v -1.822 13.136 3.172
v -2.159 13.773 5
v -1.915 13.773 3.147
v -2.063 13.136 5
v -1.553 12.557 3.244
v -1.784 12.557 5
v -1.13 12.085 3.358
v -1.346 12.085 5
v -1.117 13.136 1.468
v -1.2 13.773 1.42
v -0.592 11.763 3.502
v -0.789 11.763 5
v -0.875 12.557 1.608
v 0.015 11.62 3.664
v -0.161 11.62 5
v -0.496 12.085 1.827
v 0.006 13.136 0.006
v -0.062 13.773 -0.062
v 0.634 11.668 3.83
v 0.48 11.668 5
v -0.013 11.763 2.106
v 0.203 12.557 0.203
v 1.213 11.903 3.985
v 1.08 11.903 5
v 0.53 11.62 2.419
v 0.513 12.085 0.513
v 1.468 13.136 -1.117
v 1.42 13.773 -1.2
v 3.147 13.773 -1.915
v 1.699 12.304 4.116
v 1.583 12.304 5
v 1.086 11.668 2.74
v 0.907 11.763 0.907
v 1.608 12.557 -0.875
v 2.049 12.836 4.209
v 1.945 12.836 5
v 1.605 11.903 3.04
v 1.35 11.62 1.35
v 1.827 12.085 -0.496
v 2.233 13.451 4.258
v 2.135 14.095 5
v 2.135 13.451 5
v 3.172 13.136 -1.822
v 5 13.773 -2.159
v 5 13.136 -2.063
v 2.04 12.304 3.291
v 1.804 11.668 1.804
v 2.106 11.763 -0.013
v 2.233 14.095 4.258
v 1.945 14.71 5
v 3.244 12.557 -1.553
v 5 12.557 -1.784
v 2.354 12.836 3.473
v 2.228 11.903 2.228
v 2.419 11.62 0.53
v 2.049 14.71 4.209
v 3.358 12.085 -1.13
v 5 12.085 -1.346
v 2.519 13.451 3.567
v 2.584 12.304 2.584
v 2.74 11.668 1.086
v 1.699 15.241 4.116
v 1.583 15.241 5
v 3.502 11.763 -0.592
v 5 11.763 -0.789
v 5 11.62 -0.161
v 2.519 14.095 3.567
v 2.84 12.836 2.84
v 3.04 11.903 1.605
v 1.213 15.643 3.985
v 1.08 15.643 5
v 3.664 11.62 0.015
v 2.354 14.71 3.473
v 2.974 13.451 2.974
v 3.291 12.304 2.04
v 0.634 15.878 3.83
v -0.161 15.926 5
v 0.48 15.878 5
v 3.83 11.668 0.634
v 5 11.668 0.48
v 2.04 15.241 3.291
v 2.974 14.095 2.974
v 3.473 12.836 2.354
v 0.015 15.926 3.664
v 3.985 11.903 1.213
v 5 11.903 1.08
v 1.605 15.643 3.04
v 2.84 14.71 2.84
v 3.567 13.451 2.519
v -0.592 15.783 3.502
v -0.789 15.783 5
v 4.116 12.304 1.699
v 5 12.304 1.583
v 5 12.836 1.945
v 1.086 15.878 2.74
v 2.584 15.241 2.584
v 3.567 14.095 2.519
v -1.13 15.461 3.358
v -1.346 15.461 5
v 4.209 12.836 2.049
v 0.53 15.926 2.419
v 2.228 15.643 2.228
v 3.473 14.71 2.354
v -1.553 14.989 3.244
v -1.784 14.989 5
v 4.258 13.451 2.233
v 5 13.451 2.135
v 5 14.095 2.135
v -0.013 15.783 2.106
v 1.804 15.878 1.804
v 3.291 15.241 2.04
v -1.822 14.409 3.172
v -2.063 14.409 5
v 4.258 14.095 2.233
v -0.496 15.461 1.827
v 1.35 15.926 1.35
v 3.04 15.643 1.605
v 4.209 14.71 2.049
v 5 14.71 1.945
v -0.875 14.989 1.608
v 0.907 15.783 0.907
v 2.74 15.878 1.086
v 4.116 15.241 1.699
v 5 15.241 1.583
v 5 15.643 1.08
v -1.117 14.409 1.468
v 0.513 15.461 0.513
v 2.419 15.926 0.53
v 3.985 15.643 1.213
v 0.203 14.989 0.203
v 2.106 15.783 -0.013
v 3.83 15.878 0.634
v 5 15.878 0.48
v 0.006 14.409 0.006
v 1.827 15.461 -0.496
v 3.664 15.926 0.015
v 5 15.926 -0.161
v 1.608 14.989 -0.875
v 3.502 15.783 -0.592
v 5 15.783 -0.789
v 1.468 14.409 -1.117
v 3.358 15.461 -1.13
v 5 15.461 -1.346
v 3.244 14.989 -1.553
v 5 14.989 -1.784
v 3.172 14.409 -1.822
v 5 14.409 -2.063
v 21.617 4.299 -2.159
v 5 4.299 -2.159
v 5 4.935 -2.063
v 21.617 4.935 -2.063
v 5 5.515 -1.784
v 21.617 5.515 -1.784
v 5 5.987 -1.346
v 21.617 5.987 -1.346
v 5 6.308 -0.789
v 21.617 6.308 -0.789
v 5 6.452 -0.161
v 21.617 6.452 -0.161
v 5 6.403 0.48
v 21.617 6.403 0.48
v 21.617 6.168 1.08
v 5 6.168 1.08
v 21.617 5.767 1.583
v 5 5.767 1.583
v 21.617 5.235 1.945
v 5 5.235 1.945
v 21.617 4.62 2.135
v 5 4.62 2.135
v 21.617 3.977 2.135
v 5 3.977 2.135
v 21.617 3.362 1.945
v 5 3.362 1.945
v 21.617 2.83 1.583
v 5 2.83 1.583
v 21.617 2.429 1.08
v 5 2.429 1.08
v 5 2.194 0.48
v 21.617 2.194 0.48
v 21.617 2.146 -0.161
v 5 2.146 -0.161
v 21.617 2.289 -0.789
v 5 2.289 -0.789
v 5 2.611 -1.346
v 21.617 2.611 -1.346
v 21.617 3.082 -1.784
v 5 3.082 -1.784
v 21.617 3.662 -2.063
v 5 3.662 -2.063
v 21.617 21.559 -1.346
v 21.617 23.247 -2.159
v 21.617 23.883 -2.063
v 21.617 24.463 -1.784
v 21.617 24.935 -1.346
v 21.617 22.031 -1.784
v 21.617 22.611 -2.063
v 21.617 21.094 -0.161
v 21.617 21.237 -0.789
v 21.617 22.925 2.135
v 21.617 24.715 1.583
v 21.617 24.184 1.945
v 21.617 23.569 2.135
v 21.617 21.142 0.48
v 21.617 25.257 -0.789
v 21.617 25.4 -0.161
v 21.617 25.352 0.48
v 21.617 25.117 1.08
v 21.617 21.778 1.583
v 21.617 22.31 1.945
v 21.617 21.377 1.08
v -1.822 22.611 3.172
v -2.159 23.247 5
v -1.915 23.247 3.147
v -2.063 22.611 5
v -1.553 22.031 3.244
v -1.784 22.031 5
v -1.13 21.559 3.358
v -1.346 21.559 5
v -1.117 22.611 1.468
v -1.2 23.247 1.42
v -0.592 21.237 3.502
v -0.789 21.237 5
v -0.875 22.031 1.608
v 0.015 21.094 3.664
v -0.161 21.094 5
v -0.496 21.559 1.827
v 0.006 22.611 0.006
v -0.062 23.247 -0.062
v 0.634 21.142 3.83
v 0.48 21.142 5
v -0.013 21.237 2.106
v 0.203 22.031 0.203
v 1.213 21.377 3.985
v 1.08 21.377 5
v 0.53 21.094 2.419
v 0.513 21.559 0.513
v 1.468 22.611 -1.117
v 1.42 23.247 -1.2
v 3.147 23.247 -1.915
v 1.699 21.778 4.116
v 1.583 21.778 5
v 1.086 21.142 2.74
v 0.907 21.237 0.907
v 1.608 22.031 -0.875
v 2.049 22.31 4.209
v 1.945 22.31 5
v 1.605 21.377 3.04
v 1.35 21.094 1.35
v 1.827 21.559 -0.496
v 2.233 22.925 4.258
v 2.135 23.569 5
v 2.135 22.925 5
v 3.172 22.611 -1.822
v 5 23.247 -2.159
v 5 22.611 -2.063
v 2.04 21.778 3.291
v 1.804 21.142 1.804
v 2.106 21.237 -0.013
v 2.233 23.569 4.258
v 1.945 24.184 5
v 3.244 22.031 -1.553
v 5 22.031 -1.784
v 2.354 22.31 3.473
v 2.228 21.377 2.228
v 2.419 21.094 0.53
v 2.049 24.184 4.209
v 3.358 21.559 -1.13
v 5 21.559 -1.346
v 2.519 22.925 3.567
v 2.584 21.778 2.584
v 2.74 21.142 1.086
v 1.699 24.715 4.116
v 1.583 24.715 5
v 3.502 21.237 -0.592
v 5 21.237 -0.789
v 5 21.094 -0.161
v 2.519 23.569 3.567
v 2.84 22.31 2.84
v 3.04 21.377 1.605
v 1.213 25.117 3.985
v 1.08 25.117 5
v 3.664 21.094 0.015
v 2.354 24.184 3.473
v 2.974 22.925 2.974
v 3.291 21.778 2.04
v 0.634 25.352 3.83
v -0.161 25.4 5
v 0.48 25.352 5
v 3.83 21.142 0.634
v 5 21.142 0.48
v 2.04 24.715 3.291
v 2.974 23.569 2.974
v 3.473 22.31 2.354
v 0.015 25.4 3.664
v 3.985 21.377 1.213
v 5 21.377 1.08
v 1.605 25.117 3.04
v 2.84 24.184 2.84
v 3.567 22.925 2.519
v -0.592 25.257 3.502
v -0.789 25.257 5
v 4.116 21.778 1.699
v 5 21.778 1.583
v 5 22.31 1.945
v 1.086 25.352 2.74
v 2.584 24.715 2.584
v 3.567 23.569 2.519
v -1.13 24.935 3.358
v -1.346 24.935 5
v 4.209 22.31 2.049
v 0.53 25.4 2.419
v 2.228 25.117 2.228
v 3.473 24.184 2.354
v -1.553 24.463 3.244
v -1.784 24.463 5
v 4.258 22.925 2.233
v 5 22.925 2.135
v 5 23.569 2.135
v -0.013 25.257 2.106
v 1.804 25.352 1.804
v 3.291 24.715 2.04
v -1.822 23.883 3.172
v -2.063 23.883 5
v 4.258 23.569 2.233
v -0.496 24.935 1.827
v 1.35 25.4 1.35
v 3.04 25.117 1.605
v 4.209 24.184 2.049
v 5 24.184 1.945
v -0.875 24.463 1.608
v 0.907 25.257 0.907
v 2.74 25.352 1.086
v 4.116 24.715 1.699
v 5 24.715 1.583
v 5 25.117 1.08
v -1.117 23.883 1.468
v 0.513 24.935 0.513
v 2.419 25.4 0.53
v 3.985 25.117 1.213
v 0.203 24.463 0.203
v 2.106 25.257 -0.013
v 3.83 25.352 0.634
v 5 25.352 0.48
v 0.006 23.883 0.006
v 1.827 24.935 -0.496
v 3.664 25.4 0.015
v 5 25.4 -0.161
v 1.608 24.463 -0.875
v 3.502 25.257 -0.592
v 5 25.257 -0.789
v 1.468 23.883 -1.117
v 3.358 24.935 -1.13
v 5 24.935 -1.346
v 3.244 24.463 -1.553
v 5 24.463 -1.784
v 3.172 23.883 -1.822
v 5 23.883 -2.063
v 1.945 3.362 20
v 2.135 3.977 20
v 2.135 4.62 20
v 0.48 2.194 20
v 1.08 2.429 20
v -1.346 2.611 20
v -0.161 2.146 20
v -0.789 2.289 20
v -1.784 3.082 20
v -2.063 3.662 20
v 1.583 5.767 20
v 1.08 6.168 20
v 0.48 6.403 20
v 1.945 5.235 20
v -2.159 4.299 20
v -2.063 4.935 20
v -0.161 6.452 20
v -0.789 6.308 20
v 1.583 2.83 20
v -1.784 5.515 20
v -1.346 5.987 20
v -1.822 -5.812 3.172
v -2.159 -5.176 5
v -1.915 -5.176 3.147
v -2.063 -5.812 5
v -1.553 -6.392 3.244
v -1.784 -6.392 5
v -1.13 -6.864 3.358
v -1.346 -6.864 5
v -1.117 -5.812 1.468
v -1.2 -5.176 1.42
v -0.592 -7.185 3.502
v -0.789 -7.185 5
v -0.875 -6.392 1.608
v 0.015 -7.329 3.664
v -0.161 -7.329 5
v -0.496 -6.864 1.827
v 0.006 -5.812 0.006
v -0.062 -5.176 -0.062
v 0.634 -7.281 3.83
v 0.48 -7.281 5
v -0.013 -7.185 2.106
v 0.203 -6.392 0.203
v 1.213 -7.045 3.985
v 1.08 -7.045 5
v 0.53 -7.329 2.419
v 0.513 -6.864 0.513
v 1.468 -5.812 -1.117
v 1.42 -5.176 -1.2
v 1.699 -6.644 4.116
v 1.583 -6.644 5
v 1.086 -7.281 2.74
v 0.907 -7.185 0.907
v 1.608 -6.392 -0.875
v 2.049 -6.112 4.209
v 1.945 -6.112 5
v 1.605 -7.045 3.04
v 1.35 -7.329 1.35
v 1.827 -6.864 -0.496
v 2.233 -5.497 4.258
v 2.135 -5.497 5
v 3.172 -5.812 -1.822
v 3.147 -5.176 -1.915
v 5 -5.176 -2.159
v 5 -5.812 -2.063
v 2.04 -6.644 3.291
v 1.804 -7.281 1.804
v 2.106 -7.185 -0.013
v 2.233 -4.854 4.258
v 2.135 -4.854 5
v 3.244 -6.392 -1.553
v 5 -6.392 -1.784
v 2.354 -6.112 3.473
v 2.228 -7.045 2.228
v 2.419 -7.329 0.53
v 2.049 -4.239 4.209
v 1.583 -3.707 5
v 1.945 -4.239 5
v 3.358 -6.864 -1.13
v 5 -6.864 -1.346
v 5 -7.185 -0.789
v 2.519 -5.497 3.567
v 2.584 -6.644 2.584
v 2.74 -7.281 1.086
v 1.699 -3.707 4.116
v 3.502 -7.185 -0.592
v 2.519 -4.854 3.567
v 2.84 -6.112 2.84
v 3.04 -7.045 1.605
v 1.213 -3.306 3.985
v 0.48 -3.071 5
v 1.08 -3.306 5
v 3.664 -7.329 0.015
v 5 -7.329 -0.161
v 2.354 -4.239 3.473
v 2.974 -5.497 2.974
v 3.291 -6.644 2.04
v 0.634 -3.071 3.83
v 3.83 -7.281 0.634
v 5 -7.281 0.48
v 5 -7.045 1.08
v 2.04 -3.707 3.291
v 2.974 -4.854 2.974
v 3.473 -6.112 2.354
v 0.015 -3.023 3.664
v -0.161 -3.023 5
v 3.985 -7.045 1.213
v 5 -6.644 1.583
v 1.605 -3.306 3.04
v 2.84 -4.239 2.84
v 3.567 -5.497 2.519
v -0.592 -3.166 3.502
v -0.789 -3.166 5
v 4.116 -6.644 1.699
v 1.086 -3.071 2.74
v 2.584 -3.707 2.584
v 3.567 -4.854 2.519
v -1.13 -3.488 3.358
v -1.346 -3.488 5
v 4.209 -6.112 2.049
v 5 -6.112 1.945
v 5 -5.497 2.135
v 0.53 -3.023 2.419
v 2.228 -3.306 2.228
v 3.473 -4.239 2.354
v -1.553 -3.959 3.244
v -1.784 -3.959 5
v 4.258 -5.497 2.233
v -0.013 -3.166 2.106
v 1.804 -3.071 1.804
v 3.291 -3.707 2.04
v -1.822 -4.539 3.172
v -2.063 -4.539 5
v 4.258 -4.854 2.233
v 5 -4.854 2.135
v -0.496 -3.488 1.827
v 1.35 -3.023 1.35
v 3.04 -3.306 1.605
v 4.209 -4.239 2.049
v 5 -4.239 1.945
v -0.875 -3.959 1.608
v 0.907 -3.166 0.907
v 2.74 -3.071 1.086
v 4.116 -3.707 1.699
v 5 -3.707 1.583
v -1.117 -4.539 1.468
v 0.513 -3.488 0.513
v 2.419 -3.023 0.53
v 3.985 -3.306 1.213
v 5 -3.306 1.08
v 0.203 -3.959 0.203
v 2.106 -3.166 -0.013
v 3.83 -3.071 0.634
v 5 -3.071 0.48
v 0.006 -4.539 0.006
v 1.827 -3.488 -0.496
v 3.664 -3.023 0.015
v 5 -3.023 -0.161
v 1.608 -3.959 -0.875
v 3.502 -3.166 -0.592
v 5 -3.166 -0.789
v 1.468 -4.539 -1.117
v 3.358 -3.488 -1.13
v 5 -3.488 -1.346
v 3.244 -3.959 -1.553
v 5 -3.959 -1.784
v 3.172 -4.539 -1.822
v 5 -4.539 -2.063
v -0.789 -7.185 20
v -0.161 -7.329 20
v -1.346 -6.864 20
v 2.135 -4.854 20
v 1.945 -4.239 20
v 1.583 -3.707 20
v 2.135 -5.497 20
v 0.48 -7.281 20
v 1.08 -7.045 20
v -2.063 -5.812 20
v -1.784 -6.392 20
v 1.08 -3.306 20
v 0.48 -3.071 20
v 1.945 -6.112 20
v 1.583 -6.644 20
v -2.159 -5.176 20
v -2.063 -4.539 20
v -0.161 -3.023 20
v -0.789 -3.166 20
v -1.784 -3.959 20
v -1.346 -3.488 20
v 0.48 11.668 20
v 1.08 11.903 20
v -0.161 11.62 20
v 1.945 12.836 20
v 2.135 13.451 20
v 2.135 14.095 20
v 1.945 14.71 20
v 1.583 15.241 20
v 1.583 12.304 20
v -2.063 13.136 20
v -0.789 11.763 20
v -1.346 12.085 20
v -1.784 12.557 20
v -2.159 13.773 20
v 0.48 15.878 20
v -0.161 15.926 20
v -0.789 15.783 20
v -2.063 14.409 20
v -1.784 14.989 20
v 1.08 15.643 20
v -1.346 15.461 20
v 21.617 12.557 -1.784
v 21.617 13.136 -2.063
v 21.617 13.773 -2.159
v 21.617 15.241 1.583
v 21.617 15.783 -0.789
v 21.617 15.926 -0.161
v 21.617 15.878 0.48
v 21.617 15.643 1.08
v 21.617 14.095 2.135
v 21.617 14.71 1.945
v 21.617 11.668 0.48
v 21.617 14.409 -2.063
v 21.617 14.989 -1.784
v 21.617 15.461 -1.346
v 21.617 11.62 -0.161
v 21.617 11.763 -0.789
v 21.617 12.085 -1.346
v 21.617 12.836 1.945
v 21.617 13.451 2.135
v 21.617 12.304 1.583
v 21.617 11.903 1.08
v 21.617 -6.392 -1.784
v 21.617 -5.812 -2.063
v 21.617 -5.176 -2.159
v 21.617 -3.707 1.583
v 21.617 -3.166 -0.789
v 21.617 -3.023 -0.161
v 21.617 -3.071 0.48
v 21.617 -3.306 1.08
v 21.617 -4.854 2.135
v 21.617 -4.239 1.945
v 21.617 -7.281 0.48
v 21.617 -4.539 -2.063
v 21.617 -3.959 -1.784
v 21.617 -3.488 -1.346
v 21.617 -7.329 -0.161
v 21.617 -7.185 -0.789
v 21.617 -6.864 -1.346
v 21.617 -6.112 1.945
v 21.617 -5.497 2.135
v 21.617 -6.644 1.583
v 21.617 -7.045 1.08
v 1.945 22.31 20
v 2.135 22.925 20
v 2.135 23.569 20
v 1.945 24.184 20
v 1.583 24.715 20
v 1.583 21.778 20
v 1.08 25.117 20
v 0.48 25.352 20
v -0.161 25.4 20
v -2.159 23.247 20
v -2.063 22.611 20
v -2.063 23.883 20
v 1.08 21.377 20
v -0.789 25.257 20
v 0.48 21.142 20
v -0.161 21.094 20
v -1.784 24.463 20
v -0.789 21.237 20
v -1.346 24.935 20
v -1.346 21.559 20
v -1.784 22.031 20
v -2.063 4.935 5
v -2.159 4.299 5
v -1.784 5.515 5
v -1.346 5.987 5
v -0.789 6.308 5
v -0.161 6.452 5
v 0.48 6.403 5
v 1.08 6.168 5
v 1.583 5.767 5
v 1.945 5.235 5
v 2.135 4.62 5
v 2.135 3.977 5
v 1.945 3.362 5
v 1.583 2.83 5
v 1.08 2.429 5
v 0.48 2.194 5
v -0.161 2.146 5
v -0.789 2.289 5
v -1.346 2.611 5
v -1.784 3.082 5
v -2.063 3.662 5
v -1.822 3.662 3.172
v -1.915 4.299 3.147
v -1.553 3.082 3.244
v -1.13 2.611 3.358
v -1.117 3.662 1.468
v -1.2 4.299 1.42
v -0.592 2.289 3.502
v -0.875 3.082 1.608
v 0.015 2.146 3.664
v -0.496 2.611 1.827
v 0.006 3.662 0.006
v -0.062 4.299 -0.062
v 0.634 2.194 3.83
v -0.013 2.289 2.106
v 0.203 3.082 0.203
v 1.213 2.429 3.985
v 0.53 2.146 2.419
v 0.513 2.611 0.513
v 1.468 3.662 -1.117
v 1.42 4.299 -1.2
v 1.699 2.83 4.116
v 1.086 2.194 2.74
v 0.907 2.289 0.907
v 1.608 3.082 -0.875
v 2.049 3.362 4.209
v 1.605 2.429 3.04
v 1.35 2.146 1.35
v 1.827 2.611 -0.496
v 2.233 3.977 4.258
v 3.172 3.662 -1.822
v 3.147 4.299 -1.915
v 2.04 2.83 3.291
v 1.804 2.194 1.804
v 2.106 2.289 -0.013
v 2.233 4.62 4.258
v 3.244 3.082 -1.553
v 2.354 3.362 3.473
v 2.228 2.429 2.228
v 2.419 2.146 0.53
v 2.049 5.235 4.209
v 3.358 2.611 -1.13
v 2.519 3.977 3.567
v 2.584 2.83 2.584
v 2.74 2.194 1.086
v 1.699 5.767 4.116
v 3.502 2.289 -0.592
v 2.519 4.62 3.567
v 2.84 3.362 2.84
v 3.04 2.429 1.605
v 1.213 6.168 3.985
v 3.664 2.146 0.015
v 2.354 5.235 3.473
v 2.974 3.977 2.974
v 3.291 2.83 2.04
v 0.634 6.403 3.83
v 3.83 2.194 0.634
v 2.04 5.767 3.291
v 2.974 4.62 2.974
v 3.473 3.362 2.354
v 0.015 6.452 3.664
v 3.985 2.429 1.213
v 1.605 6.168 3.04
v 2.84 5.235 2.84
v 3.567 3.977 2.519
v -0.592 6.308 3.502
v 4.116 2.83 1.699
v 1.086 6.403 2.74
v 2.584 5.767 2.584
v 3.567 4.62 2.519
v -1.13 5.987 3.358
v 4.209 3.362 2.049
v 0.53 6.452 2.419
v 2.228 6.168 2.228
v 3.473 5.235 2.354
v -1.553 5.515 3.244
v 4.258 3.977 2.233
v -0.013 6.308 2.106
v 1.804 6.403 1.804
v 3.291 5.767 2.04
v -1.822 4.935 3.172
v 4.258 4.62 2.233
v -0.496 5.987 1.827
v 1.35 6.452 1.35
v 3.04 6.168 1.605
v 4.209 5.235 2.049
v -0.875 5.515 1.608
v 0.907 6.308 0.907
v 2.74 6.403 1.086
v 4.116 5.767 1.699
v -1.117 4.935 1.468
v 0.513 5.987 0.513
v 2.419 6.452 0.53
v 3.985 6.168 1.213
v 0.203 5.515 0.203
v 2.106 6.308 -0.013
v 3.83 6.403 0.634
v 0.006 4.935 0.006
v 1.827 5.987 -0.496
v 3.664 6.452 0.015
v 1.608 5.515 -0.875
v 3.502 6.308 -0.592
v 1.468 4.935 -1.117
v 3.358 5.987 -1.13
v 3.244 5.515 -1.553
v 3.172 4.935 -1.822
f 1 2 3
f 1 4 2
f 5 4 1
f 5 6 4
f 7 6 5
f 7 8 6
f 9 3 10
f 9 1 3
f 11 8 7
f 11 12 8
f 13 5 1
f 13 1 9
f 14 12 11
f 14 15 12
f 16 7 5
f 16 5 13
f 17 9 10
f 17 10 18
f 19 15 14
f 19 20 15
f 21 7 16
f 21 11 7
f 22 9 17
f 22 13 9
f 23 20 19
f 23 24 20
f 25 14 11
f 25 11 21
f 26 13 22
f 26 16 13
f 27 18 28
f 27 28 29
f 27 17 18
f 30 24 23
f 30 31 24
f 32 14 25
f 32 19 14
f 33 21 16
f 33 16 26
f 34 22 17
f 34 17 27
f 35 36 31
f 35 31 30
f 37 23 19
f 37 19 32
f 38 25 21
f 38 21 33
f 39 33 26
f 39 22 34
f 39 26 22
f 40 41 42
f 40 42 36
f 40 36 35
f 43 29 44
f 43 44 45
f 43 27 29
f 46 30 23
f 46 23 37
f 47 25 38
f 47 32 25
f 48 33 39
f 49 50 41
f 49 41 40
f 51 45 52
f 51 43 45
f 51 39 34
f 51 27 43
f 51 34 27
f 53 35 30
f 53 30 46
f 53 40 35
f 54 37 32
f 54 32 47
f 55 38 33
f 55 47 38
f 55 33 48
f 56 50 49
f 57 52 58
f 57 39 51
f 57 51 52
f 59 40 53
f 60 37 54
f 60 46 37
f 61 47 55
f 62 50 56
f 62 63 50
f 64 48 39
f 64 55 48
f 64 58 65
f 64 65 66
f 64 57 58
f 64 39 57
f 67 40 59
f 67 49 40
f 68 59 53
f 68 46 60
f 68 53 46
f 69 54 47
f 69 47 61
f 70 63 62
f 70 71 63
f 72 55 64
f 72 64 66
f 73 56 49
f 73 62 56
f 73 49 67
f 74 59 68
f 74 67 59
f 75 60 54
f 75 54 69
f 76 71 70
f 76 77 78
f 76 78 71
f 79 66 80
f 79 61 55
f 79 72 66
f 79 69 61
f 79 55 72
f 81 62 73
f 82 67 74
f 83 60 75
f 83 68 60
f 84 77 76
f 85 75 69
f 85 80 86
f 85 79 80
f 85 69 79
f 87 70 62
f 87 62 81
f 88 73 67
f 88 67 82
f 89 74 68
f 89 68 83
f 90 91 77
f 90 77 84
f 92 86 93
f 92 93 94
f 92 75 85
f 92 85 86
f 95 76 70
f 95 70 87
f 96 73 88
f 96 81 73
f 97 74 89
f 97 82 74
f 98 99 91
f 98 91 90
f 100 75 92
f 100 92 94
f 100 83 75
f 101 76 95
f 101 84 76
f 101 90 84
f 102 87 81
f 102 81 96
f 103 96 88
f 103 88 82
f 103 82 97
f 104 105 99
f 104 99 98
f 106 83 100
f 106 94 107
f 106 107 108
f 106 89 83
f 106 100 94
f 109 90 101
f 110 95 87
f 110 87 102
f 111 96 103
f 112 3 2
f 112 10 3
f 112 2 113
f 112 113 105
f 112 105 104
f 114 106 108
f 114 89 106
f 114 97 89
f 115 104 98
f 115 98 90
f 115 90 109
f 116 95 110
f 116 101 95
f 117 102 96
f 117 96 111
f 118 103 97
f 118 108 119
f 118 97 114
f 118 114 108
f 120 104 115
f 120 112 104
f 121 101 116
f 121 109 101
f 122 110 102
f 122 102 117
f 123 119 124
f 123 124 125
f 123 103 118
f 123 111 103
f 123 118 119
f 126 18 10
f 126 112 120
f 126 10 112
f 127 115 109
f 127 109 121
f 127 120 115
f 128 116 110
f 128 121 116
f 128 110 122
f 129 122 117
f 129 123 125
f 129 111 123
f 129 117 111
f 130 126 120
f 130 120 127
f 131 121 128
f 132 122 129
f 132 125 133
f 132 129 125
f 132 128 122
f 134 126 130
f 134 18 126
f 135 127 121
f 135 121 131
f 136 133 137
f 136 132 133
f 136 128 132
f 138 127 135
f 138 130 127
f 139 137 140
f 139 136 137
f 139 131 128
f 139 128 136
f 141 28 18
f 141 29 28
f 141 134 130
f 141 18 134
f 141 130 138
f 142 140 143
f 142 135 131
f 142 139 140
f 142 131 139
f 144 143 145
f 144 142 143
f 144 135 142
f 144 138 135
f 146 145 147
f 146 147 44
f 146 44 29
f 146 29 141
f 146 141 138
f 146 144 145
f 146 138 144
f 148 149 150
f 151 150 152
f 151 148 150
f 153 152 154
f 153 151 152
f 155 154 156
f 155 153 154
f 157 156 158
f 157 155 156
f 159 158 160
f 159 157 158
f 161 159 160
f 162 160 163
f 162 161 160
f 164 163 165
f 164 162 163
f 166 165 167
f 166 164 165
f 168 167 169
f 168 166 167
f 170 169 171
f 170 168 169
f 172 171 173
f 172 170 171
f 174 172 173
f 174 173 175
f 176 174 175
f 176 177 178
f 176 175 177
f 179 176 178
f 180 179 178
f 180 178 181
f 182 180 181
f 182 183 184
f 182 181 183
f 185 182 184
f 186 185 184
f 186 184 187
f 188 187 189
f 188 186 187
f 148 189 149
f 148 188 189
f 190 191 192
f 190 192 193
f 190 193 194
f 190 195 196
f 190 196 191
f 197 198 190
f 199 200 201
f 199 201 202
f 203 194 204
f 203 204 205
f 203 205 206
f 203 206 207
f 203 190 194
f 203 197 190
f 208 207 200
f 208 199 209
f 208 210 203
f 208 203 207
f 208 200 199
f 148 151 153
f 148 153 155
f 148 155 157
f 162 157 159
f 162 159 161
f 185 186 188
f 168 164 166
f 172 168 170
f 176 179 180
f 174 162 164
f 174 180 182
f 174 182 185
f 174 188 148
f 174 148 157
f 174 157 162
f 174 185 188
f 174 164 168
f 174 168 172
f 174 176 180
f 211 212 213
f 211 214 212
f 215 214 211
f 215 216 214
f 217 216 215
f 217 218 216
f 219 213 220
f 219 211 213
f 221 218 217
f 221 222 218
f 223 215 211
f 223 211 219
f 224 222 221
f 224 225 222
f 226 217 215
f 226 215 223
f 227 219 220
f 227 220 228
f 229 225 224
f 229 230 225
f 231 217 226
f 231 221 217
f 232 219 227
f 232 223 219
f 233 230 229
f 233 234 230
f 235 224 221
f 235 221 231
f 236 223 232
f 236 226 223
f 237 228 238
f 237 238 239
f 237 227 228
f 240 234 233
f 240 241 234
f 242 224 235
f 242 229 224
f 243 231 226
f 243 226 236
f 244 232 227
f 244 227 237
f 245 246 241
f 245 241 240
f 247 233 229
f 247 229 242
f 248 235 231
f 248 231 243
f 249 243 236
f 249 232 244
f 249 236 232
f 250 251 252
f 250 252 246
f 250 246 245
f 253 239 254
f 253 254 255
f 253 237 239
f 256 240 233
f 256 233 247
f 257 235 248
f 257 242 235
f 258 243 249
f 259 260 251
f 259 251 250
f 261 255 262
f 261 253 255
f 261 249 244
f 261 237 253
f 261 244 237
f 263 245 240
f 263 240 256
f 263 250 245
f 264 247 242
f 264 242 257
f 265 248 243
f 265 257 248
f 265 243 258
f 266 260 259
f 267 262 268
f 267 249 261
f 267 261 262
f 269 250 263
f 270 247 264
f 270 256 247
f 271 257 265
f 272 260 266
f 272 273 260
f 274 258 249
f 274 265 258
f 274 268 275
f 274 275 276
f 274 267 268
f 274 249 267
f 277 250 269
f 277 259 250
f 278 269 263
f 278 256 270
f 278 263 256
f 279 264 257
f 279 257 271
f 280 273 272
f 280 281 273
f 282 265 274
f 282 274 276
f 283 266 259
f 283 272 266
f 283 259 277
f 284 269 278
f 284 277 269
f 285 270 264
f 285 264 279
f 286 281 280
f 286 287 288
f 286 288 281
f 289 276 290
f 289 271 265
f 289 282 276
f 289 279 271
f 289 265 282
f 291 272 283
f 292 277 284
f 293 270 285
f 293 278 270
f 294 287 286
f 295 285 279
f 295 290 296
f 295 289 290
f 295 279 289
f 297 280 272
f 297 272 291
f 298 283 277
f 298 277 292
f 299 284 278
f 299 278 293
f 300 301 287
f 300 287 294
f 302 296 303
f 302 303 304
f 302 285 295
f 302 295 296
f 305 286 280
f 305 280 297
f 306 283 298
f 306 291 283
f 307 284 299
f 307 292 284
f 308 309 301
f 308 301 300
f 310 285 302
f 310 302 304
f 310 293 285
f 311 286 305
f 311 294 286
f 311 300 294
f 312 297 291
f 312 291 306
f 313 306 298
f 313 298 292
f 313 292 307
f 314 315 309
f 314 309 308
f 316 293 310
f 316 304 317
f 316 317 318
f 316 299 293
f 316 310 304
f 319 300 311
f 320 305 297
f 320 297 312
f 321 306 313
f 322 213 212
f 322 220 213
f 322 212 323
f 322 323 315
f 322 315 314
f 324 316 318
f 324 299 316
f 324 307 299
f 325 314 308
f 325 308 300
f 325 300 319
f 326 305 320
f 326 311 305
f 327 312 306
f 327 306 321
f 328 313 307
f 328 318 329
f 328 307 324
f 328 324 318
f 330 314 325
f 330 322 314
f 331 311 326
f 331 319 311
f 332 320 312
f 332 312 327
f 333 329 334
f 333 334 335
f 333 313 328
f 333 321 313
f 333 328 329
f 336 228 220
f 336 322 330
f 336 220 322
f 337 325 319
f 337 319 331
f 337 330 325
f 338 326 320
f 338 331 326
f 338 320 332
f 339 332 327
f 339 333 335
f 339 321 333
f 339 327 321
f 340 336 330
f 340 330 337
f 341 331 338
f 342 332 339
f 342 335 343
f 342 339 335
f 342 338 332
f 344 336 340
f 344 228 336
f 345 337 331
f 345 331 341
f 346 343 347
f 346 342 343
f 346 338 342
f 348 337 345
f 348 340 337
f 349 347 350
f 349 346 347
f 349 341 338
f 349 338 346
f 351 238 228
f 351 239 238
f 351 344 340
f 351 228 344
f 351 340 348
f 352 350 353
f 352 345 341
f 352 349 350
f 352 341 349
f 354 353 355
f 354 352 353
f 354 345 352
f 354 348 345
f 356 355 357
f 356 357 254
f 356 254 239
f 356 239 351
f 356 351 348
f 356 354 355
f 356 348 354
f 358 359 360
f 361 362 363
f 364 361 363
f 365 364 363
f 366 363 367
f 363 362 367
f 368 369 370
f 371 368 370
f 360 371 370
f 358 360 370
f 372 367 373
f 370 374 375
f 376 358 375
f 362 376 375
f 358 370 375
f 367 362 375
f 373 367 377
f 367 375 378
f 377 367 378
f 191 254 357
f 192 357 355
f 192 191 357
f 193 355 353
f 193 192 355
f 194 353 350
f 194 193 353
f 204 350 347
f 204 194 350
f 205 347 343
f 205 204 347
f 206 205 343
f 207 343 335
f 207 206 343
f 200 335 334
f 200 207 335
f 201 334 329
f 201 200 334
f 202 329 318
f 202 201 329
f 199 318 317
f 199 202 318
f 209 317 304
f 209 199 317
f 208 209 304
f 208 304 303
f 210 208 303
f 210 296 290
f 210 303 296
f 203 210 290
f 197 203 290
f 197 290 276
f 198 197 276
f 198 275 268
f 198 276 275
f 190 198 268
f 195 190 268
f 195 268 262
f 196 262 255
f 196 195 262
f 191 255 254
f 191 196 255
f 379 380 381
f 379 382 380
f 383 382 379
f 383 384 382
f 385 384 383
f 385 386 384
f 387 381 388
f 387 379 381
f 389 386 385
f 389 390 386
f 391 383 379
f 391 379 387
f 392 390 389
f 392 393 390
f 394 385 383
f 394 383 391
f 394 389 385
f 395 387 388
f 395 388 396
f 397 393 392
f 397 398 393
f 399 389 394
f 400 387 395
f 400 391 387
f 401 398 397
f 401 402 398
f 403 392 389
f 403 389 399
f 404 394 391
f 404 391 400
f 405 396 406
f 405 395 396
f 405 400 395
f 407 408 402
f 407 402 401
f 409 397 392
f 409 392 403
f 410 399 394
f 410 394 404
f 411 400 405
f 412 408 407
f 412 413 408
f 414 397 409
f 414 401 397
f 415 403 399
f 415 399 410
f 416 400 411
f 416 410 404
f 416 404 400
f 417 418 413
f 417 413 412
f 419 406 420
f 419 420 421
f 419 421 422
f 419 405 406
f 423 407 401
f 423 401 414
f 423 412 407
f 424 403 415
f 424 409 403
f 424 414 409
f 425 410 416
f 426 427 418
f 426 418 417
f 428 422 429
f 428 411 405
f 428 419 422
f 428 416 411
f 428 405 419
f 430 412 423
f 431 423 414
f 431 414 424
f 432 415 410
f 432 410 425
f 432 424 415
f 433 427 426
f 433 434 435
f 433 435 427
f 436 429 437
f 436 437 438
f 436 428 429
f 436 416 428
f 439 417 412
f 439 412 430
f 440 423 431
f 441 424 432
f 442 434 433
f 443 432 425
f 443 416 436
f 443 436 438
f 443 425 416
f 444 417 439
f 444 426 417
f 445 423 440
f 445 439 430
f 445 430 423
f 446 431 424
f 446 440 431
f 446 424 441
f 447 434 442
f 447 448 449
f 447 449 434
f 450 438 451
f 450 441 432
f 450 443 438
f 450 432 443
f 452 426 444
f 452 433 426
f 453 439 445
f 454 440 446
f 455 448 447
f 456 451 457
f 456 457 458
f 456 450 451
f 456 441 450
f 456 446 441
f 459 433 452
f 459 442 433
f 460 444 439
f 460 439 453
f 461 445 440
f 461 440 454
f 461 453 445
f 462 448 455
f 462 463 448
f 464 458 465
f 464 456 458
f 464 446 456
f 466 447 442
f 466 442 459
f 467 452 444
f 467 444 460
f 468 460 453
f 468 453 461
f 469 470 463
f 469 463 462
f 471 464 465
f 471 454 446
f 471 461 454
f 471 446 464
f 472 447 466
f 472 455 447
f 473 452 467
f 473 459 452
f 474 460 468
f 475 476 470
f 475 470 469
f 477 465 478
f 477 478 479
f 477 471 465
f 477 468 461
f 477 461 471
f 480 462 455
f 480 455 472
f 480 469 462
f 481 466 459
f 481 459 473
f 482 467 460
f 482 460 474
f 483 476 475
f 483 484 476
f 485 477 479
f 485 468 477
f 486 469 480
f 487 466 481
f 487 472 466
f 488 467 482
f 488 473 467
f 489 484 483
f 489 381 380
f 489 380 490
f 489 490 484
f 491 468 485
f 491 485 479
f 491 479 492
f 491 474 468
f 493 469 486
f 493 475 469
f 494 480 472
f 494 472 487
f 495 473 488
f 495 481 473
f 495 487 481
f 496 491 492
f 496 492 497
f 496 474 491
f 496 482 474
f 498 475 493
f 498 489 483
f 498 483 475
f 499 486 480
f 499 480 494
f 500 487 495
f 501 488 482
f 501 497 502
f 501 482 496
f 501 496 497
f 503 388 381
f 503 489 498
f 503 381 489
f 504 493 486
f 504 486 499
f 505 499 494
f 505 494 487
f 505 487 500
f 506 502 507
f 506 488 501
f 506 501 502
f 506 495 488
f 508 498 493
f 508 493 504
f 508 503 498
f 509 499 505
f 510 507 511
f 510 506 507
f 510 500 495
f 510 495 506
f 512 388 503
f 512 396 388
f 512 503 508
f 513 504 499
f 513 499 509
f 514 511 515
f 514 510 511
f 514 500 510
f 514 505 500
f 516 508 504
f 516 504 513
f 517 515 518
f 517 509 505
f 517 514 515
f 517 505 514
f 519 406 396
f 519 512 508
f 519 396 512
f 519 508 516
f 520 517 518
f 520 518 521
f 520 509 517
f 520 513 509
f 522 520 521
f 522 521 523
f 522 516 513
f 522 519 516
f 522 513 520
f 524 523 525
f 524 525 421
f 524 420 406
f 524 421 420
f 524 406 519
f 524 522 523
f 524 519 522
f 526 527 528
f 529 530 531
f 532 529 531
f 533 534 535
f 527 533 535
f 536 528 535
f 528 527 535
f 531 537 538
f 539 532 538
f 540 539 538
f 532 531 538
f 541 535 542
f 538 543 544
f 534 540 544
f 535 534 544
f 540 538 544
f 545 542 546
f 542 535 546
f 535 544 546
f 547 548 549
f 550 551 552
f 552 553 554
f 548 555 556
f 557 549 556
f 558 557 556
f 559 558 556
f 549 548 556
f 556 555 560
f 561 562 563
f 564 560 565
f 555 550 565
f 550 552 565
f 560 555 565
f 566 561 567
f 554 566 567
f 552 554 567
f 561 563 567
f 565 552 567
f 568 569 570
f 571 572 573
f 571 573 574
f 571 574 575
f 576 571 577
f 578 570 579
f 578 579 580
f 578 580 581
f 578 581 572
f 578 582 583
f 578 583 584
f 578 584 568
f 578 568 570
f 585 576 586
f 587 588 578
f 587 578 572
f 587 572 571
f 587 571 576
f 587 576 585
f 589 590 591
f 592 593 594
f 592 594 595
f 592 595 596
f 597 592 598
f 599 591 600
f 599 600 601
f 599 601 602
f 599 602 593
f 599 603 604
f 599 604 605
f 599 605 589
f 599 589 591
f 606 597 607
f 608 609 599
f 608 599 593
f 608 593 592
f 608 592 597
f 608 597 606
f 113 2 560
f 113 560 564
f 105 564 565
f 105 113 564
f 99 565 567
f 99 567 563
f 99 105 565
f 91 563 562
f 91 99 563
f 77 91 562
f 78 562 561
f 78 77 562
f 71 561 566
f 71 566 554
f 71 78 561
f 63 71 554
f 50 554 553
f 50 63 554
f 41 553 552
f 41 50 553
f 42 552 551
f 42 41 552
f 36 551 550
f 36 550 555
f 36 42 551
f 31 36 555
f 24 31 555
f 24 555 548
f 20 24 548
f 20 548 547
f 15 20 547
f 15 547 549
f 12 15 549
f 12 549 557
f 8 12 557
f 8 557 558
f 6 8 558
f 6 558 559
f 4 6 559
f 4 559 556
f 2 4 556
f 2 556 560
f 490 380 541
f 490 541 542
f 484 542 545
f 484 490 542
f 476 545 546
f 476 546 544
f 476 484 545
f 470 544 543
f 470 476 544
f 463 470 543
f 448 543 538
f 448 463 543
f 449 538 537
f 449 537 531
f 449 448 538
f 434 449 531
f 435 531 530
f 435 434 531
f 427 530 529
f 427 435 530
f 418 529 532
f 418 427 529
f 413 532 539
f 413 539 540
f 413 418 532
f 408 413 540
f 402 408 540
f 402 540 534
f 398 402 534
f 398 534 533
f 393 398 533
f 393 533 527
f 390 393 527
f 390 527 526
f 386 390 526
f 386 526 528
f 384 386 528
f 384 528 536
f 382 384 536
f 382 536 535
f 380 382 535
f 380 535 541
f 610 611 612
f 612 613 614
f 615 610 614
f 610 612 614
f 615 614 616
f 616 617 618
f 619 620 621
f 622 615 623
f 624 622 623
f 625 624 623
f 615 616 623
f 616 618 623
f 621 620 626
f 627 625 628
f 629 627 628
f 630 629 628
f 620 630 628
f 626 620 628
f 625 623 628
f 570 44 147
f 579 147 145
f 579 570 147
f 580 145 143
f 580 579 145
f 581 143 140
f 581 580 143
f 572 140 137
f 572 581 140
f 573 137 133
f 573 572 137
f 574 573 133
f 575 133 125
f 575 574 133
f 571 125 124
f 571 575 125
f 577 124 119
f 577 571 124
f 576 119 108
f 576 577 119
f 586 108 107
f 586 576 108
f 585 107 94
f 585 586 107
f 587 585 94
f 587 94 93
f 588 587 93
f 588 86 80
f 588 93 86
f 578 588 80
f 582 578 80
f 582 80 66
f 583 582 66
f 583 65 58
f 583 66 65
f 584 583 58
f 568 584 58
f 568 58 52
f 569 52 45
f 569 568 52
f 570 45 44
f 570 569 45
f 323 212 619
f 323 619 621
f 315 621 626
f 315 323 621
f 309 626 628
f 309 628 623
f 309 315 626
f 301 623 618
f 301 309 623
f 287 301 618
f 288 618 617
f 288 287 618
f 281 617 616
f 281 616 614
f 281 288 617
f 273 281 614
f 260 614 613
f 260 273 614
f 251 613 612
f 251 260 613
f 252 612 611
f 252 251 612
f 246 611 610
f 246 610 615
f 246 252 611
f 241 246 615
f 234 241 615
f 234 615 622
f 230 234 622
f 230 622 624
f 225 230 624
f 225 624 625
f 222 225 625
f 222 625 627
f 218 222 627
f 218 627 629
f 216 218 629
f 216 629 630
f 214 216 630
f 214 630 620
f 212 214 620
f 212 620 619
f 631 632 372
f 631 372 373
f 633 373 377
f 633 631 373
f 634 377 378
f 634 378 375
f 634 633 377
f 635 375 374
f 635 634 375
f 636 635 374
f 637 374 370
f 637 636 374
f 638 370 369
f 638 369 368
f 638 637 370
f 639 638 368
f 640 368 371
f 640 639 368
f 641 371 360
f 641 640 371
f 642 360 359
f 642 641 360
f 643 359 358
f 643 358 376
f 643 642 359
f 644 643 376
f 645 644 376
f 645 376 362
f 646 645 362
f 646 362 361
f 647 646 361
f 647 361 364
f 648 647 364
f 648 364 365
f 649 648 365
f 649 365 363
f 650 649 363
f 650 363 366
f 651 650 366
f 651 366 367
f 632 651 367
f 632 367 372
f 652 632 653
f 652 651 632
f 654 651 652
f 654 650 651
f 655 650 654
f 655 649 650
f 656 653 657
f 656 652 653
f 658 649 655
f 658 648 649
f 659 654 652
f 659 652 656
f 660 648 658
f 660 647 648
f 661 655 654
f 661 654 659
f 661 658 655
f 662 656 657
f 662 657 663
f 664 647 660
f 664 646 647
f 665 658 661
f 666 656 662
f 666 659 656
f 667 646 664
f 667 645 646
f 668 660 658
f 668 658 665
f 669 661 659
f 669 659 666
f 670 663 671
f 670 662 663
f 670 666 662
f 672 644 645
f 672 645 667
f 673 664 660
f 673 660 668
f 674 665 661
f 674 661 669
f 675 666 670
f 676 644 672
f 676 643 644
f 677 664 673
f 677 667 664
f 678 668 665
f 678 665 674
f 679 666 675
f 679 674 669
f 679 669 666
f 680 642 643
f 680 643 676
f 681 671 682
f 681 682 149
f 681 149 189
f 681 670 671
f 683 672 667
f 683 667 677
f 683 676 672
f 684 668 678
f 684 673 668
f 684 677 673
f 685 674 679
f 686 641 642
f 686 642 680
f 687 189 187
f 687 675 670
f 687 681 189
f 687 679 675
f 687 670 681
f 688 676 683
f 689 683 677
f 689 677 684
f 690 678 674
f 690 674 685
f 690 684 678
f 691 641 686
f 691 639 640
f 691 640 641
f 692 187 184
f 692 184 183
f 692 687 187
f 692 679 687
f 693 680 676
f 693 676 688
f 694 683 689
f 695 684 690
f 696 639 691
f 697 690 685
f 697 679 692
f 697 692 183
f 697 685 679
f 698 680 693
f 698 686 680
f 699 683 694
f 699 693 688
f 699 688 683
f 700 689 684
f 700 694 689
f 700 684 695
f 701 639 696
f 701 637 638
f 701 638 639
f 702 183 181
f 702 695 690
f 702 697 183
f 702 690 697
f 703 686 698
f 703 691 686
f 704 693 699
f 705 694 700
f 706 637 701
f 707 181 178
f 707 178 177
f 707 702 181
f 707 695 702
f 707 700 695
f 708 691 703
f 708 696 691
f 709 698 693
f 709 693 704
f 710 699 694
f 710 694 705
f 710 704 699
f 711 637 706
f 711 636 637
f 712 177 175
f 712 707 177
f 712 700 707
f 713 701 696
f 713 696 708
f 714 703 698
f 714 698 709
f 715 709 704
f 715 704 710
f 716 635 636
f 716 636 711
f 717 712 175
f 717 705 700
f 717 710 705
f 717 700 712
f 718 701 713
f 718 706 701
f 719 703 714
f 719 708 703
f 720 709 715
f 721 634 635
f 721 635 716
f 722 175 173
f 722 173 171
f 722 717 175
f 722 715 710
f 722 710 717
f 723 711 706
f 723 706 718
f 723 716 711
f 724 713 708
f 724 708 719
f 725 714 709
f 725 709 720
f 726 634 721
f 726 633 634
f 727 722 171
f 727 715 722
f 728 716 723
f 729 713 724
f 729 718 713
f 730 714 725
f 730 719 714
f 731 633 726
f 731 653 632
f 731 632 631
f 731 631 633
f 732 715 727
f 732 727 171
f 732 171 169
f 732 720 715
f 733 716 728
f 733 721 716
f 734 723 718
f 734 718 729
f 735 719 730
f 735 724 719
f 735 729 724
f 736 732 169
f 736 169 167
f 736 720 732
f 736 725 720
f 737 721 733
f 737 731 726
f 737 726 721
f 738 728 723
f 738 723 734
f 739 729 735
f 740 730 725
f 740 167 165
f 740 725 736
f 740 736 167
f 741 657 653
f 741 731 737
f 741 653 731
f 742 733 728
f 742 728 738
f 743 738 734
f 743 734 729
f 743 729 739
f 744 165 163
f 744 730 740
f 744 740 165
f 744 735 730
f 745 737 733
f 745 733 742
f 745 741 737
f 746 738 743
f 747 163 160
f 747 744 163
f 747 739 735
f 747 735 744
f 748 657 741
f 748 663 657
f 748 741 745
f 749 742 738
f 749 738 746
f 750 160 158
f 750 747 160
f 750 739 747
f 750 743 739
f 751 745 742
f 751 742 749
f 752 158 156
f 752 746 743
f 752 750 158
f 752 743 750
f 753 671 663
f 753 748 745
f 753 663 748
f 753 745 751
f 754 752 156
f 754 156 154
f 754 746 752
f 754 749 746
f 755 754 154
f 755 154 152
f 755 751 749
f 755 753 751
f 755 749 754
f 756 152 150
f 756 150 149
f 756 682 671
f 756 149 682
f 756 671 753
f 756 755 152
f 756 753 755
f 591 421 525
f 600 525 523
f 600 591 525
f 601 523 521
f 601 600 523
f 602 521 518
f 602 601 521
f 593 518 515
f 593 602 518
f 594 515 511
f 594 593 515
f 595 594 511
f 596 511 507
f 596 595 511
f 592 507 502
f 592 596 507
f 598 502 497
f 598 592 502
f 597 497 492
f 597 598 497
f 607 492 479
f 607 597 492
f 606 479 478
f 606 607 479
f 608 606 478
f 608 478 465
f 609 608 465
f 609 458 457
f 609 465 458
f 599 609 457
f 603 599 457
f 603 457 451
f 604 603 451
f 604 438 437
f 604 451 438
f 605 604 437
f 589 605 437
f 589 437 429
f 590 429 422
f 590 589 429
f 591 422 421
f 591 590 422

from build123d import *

# Parameters (mm, degrees)
SKETCH8_R = 2.159


with BuildPart() as part:
    # Sweep1: sweep along a curve in space
    with BuildLine() as sweep1_path:
        Line((0, 23.246956006, 20), (0, 23.246956006, 5))
        ThreePointArc((0, 23.246956006, 5), (1.464466094, 23.246956006, 1.464466094), (5, 23.246956006, 0))
        Line((5, 23.246956006, 0), (18.36665, 23.246956006, 0))
        Line((18.36665, 23.246956006, 0), (21.61665, 23.246956006, 0))
    # Sketch8 → Sweep1 (sweep)
    with BuildSketch(Plane(origin=(21.61665, 23.246956006, 0), x_dir=(0, 0, -1), z_dir=(1, 0, 0))):
        Circle(SKETCH8_R)
        with Locations((0, -9.4742)):
            Circle(SKETCH8_R)
        with Locations((0, -28.4226)):
            Circle(SKETCH8_R)
        with Locations((0, -18.9484)):
            Circle(SKETCH8_R)
    sweep(path=sweep1_path.line)


solid = part.part
